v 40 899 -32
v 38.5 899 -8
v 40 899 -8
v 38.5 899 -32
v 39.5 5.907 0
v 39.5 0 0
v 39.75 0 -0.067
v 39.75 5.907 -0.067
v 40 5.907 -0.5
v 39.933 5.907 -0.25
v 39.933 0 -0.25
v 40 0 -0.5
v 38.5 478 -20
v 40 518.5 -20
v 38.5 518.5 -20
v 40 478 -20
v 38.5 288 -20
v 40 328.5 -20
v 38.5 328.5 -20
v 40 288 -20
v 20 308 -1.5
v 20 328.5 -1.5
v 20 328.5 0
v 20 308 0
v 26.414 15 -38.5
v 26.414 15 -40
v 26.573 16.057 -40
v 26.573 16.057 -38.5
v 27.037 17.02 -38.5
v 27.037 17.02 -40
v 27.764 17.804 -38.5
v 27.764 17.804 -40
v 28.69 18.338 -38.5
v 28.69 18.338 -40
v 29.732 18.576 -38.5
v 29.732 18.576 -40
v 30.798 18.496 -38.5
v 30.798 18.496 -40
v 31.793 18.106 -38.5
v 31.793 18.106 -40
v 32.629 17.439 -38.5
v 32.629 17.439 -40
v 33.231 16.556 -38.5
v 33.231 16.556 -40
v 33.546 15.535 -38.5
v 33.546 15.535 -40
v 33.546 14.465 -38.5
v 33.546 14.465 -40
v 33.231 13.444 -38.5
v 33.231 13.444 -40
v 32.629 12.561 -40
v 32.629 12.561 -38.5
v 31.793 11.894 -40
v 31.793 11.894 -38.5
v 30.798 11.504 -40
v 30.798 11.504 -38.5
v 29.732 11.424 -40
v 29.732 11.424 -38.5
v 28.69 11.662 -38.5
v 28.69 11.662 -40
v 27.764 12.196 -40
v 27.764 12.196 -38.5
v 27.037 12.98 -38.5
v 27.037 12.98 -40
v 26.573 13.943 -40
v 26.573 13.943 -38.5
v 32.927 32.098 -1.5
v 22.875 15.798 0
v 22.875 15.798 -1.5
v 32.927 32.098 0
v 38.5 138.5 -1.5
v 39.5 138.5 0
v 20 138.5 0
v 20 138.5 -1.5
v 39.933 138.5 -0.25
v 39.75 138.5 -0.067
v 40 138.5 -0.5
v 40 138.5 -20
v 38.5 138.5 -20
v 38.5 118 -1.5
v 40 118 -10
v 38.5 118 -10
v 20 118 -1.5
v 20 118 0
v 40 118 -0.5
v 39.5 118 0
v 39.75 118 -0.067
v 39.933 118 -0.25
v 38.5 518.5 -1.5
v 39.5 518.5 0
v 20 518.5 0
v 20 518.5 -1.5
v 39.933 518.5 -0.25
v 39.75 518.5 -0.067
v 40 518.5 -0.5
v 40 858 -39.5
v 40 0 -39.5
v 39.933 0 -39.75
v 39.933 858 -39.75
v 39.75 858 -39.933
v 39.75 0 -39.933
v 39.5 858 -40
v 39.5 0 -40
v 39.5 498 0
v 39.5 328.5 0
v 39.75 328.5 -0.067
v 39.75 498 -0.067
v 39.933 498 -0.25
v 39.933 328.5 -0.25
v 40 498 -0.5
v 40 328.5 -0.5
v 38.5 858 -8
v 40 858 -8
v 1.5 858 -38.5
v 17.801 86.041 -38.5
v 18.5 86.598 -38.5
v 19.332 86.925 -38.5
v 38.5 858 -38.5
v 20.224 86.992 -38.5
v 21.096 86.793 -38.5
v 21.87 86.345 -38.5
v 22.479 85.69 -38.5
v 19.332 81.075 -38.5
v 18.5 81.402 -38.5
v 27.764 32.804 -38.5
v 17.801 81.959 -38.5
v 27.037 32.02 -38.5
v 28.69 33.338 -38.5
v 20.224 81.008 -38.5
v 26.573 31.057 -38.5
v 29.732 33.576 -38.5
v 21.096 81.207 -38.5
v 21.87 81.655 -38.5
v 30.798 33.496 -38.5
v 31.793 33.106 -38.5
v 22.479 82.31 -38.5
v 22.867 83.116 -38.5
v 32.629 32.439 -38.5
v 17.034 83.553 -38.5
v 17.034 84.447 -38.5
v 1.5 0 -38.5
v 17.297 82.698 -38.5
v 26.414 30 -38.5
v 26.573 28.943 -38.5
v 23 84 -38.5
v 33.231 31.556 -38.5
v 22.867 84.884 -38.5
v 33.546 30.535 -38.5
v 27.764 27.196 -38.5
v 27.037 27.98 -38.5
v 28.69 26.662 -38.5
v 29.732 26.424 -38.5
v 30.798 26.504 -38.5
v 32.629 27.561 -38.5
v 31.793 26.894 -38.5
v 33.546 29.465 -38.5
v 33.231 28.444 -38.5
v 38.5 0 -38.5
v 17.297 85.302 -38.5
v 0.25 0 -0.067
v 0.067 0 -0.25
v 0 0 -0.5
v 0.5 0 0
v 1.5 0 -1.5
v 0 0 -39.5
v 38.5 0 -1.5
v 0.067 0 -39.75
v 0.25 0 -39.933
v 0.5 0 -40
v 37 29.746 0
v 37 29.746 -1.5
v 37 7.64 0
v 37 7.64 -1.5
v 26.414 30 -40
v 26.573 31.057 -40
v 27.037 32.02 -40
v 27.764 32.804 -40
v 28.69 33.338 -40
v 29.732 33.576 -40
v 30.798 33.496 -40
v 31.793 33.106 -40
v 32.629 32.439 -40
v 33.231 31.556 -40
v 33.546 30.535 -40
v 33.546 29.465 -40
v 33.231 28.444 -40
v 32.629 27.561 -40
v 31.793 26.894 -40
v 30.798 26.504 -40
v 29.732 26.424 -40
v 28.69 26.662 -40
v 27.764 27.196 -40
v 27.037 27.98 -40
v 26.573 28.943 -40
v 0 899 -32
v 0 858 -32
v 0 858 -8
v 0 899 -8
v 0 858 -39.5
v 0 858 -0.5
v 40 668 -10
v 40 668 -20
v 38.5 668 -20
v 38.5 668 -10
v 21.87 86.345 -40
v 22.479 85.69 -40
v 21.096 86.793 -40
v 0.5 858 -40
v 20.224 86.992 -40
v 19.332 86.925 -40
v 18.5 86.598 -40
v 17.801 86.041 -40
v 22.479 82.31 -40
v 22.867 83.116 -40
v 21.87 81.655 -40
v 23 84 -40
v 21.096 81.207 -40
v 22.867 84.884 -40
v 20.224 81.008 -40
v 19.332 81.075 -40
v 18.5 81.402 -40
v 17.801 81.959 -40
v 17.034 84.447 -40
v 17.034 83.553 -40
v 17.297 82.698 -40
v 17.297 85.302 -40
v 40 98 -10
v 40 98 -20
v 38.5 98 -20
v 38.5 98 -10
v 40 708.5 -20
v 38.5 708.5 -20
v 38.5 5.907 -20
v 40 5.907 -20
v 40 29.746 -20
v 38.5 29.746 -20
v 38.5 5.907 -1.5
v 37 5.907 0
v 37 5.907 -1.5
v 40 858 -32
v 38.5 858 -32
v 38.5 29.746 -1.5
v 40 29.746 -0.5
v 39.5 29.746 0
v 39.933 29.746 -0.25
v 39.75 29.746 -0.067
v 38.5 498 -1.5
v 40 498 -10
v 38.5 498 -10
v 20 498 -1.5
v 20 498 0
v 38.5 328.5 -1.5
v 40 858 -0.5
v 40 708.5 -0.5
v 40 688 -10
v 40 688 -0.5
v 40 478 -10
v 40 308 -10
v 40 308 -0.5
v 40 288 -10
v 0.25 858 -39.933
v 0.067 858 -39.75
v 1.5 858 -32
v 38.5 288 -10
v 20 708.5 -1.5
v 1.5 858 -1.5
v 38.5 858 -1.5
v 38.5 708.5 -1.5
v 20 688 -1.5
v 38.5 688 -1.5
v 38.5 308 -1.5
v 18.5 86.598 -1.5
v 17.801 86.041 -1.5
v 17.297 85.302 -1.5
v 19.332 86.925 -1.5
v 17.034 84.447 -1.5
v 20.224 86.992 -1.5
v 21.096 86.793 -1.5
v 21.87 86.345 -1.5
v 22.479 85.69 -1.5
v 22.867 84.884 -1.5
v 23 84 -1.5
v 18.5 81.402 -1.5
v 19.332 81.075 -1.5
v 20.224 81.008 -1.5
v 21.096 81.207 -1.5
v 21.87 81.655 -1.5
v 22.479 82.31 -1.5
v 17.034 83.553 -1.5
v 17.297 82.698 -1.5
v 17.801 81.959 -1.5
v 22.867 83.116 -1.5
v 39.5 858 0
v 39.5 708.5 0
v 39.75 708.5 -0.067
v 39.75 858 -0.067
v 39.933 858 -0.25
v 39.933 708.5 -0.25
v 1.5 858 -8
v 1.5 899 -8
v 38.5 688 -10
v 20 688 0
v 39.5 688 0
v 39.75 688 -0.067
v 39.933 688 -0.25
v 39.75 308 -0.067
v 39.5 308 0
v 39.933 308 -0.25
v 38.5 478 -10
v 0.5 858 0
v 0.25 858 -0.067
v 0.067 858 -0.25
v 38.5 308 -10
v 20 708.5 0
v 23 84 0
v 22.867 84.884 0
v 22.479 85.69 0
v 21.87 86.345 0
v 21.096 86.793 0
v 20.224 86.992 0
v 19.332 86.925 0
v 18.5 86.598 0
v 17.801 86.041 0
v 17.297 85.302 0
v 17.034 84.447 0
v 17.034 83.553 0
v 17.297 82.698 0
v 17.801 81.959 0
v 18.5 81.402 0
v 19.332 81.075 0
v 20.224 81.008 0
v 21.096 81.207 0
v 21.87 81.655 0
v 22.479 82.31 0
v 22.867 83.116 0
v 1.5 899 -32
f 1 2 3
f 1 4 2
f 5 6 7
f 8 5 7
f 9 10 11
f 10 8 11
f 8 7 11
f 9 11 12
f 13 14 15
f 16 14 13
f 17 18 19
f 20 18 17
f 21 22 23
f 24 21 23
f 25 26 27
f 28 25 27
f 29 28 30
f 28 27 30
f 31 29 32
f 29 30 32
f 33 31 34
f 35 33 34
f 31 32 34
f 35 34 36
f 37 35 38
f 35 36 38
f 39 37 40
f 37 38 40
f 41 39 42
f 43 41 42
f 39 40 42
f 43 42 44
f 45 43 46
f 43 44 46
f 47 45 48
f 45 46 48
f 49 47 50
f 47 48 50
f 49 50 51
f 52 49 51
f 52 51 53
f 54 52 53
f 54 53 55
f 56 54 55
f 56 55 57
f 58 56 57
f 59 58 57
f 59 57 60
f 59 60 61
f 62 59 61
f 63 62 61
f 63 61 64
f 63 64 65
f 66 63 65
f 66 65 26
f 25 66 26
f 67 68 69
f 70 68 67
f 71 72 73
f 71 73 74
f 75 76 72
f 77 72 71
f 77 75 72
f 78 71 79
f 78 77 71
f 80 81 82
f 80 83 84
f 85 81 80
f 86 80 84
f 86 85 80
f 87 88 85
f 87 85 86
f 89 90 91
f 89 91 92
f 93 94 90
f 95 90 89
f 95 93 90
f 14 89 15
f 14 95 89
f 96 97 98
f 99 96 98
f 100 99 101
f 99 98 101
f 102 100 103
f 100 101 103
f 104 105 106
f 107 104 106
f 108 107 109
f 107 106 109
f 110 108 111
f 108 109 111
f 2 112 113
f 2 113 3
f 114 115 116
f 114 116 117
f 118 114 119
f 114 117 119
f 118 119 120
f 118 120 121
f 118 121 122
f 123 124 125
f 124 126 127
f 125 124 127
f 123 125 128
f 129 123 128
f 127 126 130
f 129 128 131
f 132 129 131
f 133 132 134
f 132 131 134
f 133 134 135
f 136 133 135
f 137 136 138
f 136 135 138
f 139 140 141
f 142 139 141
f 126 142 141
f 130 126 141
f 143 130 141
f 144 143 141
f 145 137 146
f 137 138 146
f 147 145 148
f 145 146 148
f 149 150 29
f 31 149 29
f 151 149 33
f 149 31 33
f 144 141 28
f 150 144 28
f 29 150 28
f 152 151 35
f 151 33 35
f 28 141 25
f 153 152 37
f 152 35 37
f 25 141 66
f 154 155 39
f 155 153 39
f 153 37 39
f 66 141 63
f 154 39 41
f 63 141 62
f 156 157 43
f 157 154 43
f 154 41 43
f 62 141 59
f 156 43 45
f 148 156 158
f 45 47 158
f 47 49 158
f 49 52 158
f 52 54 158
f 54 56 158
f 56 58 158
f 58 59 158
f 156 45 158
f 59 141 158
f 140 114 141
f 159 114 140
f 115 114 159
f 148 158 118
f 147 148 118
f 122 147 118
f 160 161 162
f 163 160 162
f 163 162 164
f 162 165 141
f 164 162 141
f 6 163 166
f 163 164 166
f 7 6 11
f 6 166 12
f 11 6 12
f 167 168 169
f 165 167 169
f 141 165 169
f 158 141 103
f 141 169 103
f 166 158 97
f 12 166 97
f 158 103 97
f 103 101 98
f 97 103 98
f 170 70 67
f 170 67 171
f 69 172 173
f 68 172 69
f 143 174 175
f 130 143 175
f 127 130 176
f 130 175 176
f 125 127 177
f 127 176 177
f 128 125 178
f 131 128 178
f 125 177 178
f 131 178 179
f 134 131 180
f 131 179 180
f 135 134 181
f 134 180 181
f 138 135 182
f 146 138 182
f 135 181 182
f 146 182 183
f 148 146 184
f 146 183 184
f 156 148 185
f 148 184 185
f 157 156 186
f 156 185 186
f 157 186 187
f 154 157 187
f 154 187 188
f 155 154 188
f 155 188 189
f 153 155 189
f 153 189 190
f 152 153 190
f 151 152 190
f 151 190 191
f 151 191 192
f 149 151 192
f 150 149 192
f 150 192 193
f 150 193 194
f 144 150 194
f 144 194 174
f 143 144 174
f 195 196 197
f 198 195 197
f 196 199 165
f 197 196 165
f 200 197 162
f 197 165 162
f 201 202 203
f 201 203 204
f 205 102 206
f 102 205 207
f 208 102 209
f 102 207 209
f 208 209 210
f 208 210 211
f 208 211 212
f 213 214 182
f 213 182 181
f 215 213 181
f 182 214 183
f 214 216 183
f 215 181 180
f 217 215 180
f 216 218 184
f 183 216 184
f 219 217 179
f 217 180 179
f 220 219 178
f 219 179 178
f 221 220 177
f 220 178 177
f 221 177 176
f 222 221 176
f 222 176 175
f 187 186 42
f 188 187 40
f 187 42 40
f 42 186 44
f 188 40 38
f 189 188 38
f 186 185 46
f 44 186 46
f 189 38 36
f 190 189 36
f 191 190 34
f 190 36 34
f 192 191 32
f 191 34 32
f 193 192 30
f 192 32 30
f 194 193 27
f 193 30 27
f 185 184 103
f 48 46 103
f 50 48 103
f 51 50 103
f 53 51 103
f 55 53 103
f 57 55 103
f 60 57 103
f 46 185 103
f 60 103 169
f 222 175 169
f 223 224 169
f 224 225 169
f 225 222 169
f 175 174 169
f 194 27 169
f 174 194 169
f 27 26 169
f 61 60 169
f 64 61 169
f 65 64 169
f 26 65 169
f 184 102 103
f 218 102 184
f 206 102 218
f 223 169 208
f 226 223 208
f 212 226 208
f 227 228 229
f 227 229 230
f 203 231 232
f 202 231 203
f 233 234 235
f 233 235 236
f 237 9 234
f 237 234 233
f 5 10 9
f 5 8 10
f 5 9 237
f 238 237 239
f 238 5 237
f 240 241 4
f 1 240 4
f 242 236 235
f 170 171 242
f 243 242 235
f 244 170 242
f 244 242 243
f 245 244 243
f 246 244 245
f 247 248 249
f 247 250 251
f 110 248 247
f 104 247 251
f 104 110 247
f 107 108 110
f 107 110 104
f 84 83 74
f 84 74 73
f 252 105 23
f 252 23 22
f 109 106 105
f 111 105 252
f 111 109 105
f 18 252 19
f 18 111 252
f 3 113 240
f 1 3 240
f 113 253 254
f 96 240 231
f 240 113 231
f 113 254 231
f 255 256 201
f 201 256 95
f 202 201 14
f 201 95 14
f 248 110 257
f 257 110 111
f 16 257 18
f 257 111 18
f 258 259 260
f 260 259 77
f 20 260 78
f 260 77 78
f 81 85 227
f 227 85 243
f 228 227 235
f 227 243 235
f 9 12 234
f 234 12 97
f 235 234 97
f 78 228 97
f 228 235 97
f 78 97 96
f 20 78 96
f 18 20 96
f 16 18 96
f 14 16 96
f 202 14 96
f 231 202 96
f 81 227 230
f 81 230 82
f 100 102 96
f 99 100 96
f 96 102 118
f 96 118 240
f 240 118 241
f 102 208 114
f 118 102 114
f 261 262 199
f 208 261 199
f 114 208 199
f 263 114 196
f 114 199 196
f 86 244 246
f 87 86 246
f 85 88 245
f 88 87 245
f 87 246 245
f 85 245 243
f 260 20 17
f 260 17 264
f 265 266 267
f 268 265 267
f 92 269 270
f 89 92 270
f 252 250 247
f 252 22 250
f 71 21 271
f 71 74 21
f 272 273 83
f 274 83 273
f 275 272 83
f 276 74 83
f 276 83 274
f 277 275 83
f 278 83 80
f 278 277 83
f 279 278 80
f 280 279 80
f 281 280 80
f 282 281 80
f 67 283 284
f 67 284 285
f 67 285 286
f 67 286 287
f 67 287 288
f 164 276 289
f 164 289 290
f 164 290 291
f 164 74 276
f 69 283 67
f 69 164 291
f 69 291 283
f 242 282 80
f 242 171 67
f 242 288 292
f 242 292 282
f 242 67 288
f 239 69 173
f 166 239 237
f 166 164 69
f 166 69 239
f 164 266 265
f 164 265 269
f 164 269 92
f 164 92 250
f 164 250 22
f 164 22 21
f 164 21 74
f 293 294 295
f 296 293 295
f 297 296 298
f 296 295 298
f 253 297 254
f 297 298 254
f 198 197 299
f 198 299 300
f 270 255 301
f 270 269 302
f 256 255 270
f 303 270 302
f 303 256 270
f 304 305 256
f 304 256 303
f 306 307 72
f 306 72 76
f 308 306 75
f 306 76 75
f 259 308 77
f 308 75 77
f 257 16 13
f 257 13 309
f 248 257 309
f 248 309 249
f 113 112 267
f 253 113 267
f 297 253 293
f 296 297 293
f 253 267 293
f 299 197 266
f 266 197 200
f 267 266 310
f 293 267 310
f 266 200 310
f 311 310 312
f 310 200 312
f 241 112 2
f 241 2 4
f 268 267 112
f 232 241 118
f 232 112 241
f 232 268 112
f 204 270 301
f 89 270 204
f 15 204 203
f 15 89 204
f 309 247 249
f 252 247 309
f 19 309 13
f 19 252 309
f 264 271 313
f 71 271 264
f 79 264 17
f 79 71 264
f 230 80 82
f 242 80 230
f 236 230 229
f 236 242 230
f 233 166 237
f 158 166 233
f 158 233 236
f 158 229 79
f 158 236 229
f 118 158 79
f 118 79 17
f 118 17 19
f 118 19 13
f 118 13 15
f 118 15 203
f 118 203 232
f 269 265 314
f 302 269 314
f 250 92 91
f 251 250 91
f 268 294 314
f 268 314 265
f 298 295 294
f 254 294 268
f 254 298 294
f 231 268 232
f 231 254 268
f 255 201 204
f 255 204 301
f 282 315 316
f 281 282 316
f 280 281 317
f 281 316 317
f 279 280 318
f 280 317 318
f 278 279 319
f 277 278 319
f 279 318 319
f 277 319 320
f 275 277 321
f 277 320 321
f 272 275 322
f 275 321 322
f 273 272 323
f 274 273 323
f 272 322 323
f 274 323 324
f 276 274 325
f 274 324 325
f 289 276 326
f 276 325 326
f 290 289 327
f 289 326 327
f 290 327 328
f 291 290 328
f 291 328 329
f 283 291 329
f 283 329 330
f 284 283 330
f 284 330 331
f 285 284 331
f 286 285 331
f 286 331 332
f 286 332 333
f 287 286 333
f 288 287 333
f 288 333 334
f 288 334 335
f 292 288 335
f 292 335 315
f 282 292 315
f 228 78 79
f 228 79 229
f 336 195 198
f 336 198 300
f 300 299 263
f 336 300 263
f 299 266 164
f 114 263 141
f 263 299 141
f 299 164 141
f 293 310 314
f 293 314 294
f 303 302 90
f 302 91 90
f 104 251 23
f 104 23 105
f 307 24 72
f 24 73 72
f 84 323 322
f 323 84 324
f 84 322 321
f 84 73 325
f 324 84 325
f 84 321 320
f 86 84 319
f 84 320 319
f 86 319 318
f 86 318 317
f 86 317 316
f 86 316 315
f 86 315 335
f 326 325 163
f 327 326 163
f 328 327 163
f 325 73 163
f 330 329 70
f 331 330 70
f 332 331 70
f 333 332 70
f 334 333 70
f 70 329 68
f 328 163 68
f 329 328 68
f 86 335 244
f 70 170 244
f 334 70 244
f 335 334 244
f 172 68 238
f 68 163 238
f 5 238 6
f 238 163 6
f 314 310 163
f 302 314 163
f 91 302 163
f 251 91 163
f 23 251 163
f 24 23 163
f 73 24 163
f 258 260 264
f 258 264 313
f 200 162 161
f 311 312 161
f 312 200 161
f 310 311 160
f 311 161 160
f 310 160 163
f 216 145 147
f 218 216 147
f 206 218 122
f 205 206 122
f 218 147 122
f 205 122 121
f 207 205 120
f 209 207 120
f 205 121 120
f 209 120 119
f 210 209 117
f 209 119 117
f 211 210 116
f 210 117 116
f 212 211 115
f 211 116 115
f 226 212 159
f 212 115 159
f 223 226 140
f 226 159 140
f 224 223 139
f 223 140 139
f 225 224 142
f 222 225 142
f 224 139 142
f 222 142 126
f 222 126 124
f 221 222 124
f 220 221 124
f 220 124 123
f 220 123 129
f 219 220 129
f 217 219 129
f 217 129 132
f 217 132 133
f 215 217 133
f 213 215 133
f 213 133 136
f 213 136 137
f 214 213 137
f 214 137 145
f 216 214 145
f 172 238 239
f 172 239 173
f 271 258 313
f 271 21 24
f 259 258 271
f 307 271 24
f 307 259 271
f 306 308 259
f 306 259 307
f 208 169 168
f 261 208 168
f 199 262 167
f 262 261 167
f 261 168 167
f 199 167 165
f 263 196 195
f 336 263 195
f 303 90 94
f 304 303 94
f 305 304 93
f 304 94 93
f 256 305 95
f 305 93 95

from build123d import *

# Parameters (mm, degrees)
SKETCH1_W           = 37
SKETCH1_H           = 37
BOSS_EXTRUDE1_DEPTH = 899
CUT_EXTRUDE2_DEPTH  = 20
SKETCH4_W           = 8
SKETCH4_H           = 41
CUT_EXTRUDE3_DEPTH  = 901.777997067
SKETCH5_R           = 3.58636949
CUT_EXTRUDE4_DEPTH  = 10
CUT_EXTRUDE5_DEPTH  = 20
SKETCH7_R           = 3
CUT_EXTRUDE6_DEPTH  = 901.777997067


with BuildPart() as part:
    # Sketch1 → Boss-Extrude1 (new body)
    with BuildSketch(Plane(origin=(0, 0, 0), x_dir=(1, 0, 0), z_dir=(0, 1, 0))):
        with BuildLine():
            Line((0.5, 0), (39.5, 0))
            ThreePointArc((39.5, 0), (39.853553391, 0.146446609), (40, 0.5))
            Line((40, 0.5), (40, 39.5))
            ThreePointArc((40, 39.5), (39.853553391, 39.853553391), (39.5, 40))
            Line((39.5, 40), (0.5, 40))
            ThreePointArc((0.5, 40), (0.146446609, 39.853553391), (0, 39.5))
            Line((0, 39.5), (0, 0.5))
            ThreePointArc((0, 0.5), (0.146446609, 0.146446609), (0.5, 0))
        make_face()
        with Locations((20, 20)):
            Rectangle(SKETCH1_W, SKETCH1_H, mode=Mode.SUBTRACT)
    extrude(amount=BOSS_EXTRUDE1_DEPTH)

    # Sketch3 → Cut-Extrude2 (cut)
    with BuildSketch(Plane.XY):
        Polygon((40, 5.907288086), (37, 5.907288086), (37, 7.639845548), (22.874509033, 15.797587142), (32.926772366, 32.098076211), (37, 29.74639714), (40, 29.74639714), (40, 28.014346333), align=None)
    extrude(amount=-CUT_EXTRUDE2_DEPTH, mode=Mode.SUBTRACT)

    # Sketch4 → Cut-Extrude3 (cut, through all)
    with BuildSketch(Plane.ZY):
        with Locations((-4, 878.5)):
            Rectangle(SKETCH4_W, SKETCH4_H)
        with Locations((-36, 878.5)):
            Rectangle(SKETCH4_W, SKETCH4_H)
    extrude(amount=-CUT_EXTRUDE3_DEPTH, mode=Mode.SUBTRACT)

    # Sketch5 → Cut-Extrude4 (cut)
    with BuildSketch(Plane(origin=(0, 0, -40), x_dir=(-1, 0, 0), z_dir=(0, 0, -1))):
        with Locations((-30, 30)):
            Circle(SKETCH5_R)
        with Locations((-30, 15)):
            Circle(SKETCH5_R)
    extrude(amount=-CUT_EXTRUDE4_DEPTH, mode=Mode.SUBTRACT)

    # Sketch6 → Cut-Extrude5 (cut)
    with BuildSketch(Plane(origin=(40, 0, 0), x_dir=(0, 0, -1), z_dir=(1, 0, 0))):
        Polygon((0, 708.5), (20, 708.5), (20, 668), (10, 668), (10, 688), (0, 688), align=None)
        Polygon((0, 518.5), (20, 518.5), (20, 478), (10, 478), (10, 498), (0, 498), align=None)
        Polygon((0, 328.5), (20, 328.5), (20, 288), (10, 288), (10, 308), (0, 308), align=None)
        Polygon((0, 138.5), (20, 138.5), (20, 98), (10, 98), (10, 118), (0, 118), align=None)
    extrude(amount=-CUT_EXTRUDE5_DEPTH, mode=Mode.SUBTRACT)

    # Sketch7 → Cut-Extrude6 (cut, through all)
    with BuildSketch(Plane.XY):
        with Locations((20, 84)):
            Circle(SKETCH7_R)
    extrude(amount=-CUT_EXTRUDE6_DEPTH, mode=Mode.SUBTRACT)


solid = part.part
